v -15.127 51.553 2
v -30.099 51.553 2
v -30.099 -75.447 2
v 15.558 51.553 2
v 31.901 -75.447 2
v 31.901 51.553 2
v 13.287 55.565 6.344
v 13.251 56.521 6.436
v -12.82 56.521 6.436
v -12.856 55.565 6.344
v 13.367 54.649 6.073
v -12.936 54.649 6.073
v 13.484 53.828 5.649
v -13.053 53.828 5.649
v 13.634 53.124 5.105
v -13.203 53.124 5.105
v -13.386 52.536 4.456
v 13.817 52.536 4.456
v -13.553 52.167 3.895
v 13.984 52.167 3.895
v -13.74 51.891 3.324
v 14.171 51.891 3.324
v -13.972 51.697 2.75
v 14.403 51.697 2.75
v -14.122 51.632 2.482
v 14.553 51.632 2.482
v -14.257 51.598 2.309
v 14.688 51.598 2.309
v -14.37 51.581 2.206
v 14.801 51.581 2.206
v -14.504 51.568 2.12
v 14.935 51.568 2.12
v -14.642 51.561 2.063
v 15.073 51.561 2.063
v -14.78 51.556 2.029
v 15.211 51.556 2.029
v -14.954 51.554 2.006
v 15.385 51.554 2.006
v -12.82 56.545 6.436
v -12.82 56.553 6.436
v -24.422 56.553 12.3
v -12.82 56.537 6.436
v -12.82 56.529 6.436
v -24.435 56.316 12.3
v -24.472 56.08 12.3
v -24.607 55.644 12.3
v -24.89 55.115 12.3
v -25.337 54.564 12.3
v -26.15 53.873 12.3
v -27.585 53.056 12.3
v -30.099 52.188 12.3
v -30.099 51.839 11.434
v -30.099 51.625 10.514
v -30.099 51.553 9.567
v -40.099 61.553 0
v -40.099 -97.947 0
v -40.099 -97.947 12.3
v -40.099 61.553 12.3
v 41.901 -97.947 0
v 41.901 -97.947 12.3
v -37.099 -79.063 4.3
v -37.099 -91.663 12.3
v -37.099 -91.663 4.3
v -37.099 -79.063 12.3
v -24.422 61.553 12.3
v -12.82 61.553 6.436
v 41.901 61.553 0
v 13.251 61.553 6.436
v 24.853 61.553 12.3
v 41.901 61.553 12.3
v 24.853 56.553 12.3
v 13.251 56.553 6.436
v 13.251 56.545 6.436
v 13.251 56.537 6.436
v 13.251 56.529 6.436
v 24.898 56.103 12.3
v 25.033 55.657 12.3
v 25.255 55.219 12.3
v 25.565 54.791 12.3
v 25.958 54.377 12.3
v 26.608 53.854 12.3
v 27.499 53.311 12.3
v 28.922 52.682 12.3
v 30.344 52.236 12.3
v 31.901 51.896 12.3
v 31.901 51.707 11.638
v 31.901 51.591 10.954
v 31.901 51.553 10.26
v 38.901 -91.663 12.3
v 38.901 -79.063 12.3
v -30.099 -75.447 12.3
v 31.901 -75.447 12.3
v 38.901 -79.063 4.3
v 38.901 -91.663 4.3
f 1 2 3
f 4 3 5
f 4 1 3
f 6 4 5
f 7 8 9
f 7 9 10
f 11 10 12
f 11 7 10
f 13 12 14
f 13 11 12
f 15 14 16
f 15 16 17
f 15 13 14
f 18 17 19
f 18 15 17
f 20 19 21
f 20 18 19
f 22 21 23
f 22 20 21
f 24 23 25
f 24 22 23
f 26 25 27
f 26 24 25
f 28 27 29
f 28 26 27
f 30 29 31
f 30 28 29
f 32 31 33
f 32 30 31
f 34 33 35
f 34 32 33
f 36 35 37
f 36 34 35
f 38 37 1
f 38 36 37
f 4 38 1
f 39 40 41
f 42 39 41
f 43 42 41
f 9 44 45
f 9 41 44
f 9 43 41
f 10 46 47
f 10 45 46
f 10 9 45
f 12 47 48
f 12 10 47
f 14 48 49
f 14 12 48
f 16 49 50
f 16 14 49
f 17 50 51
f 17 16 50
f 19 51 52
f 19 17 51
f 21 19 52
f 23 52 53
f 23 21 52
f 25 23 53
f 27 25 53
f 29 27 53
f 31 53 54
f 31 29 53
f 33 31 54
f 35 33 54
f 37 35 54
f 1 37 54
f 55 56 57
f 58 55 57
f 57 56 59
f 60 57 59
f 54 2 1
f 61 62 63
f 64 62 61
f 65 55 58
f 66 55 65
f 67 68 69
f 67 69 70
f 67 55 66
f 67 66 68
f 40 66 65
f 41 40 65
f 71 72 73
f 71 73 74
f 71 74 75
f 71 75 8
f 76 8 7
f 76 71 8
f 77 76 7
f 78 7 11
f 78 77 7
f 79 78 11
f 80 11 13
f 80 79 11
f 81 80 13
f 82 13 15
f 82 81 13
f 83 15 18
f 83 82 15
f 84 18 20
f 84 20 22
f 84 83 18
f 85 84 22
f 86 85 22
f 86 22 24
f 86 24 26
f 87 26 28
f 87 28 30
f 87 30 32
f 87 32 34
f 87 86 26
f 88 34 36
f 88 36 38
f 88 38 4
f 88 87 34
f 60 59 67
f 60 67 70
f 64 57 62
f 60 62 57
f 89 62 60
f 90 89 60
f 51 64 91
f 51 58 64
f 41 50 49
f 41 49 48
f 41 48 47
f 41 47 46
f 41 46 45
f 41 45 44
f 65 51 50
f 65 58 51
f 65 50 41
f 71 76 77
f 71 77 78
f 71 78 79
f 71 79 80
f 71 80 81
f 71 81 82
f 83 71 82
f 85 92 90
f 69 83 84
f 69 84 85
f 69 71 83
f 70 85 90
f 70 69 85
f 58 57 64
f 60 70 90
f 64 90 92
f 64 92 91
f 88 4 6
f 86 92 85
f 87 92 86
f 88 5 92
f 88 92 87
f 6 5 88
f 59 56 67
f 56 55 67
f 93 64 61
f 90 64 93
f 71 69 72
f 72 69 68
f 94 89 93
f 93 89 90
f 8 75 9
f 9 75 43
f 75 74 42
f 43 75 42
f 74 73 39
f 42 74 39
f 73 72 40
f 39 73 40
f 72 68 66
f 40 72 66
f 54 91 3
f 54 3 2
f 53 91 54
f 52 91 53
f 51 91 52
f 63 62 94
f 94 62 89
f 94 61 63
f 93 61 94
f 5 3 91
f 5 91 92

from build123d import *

# Parameters (mm, degrees)
F0_W         = 82
F0_H         = 147
F0_W_2       = 62
F0_H_2       = 127
F1_DEPTH     = 12.3
F2_DEPTH     = 2
F4_DEPTH     = 12.5
F5_W         = 76
F5_H         = 12.6
F6_DEPTH     = 8
F7_DEPTH     = 25
F8_T4_DEPTH  = 38
F8_T10_DEPTH = 50.9116130734
F8_T16_DEPTH = 38
F8_T23_DEPTH = 38
F8_T28_DEPTH = 50.9116130734
F8_T35_DEPTH = 50.9116130734
F8_T39_DEPTH = 38


# Not quite as in the source:
# - a fillet or chamfer that OpenCascade refuses, or shapes differently, is made with other operations: its cross-section is extruded or revolved along the edge and cut away or added


with BuildPart() as f1:
    # F0 (on Top) → F1 (new body)
    with BuildSketch(Plane.XY):
        with Locations((0.9012136459, -11.9470648118)):
            Rectangle(F0_W, F0_H)
        with Locations((0.9012136459, -11.9470648118)):
            Rectangle(F0_W_2, F0_H_2, mode=Mode.SUBTRACT)
    extrude(amount=F1_DEPTH)

    # F0 (on Top) → F2 (join)
    with BuildSketch(Plane.XY):
        with Locations((0.9012136459, -11.9470648118)):
            Rectangle(F0_W_2, F0_H_2)
    extrude(amount=F2_DEPTH)

    # F4 (add): a face of the model
    f4_faces = [f1.faces().sort_by_distance(p)[0] for p in [
        (0.9012136459, -85.4470648118, 6.15),
    ]]
    extrude(f4_faces, amount=F4_DEPTH)

    # F5 (on face) → F6 (cut)
    with BuildSketch(Plane.XY.offset(12.3)):
        with Locations((0.9012136459, -85.3629247222)):
            Rectangle(F5_W, F5_H)
    extrude(amount=-F6_DEPTH, mode=Mode.SUBTRACT)

    # F3 (on face) → F7 (cut)
    with BuildSketch(Plane(origin=(0, 61.5529351882, 0), x_dir=(-1, 0, 0), z_dir=(0, 1, 0))):
        Polygon((24.4224453152, 12.3), (-24.8533971608, 12.3), (-13.251022455, 6.4361359849), (12.8200706095, 6.4361359849), align=None)
    extrude(amount=-F7_DEPTH, mode=Mode.SUBTRACT)

    # F8: fillet of radius 5 on 3 edges, made by hand


with BuildPart() as f8_tool2:
    # F8_s3 → F8_t4 (new body)
    with BuildSketch(Plane(origin=(-1.6465684555, 0, 0.8321790805), x_dir=(0, 1, 0), z_dir=(-0.892490362, 0, 0.4510664627))):
        with BuildLine():
            ThreePointArc((56.5529351882, 0.0385145664), (53.0174012823, 1.5029806605), (51.5529351882, 5.0385145664))
            Line((51.5529351882, 5.0385145664), (51.5529351882, 0.0385145664))
            Line((51.5529351882, 0.0385145664), (56.5529351882, 0.0385145664))
        make_face()
    extrude(amount=F8_T4_DEPTH)

    split(bisect_by=Plane.XY.offset(6.4361359849), keep=Keep.TOP)

    split(bisect_by=Plane.YZ.offset(-30.0987863541), keep=Keep.TOP)


with BuildPart() as f1_1:
    add(f1.part)

    # F8_t1: cut F8_tool2
    add(f8_tool2.part, mode=Mode.SUBTRACT)


with BuildPart() as f8_tool8:
    # F8_s9 → F8_t10 (new body)
    with BuildSketch(Plane.YZ.offset(25.6712824595)):
        with BuildLine():
            ThreePointArc((56.52103919, 6.4361359849), (53.1908229865, 5.1657016483), (51.5529351882, 2))
            Line((51.5529351882, 2), (51.5529351882, 6.4361359849))
            Line((51.5529351882, 6.4361359849), (56.52103919, 6.4361359849))
        make_face()
    extrude(amount=-F8_T10_DEPTH)

    split(bisect_by=Plane(origin=(-0.0173726292, 0, -0.0343738793), x_dir=(0, 1, 0), z_dir=(0.4510664627, 0, 0.892490362)), keep=Keep.TOP)

    split(bisect_by=Plane(origin=(0.1050545028, 0, -0.2078632285), x_dir=(0, 1, 0), z_dir=(-0.4510664627, 0, 0.892490362)), keep=Keep.TOP)


with BuildPart() as f1_2:
    add(f1_1.part)

    # F8_t7: cut F8_tool8
    add(f8_tool8.part, mode=Mode.SUBTRACT)


with BuildPart() as f8_tool14:
    # F8_s15 → F8_t16 (new body)
    with BuildSketch(Plane(origin=(35.9044721827, 0, 18.1461940123), x_dir=(0, 1, 0), z_dir=(-0.892490362, 0, -0.4510664627))):
        with BuildLine():
            ThreePointArc((56.5529351882, 0.232902491), (53.0174012823, 1.6973685851), (51.5529351882, 5.232902491))
            Line((51.5529351882, 5.232902491), (51.5529351882, 0.232902491))
            Line((51.5529351882, 0.232902491), (56.5529351882, 0.232902491))
        make_face()
    extrude(amount=F8_T16_DEPTH)

    split(bisect_by=Plane.XY.offset(6.4361359849), keep=Keep.TOP)

    split(bisect_by=Plane.YZ.offset(31.9012136459), keep=Keep.BOTTOM)


with BuildPart() as f1_3:
    add(f1_2.part)

    # F8_t13: cut F8_tool14
    add(f8_tool14.part, mode=Mode.SUBTRACT)


with BuildPart() as f8_tool21:
    # F8_s22 → F8_t23 (new body)
    with BuildSketch(Plane(origin=(-1.6465684555, 0, 0.8321790805), x_dir=(0, 1, 0), z_dir=(-0.892490362, 0, 0.4510664627))):
        with BuildLine():
            ThreePointArc((56.5529351882, 0.0385145664), (53.0174012823, 1.5029806605), (51.5529351882, 5.0385145664))
            Line((51.5529351882, 5.0385145664), (51.5529351882, 0.0385145664))
            Line((51.5529351882, 0.0385145664), (56.5529351882, 0.0385145664))
        make_face()
    extrude(amount=F8_T23_DEPTH)

    split(bisect_by=Plane.XY.offset(6.4361359849), keep=Keep.BOTTOM)

    split(bisect_by=Plane.XY.offset(2), keep=Keep.TOP)


with BuildPart() as f8_tool26:
    # F8_s27 → F8_t28 (new body)
    with BuildSketch(Plane.YZ.offset(25.6712824595)):
        with BuildLine():
            ThreePointArc((56.52103919, 6.4361359849), (53.1908229865, 5.1657016483), (51.5529351882, 2))
            Line((51.5529351882, 2), (51.5529351882, 6.4361359849))
            Line((51.5529351882, 6.4361359849), (56.52103919, 6.4361359849))
        make_face()
    extrude(amount=-F8_T28_DEPTH)

    split(bisect_by=Plane(origin=(-0.0173726292, 0, -0.0343738793), x_dir=(0, 1, 0), z_dir=(-0.4510664627, 0, -0.892490362)), keep=Keep.TOP)


with BuildPart() as f8_tool21_1:
    add(f8_tool21.part)

    # F8_t30: intersect F8_tool26
    add(f8_tool26.part, mode=Mode.INTERSECT)


with BuildPart() as f1_4:
    add(f1_3.part)

    # F8_t19: cut F8_tool21
    add(f8_tool21_1.part, mode=Mode.SUBTRACT)


with BuildPart() as f8_tool33:
    # F8_s34 → F8_t35 (new body)
    with BuildSketch(Plane.YZ.offset(25.6712824595)):
        with BuildLine():
            ThreePointArc((56.52103919, 6.4361359849), (53.1908229865, 5.1657016483), (51.5529351882, 2))
            Line((51.5529351882, 2), (51.5529351882, 6.4361359849))
            Line((51.5529351882, 6.4361359849), (56.52103919, 6.4361359849))
        make_face()
    extrude(amount=-F8_T35_DEPTH)

    split(bisect_by=Plane(origin=(0.1050545028, 0, -0.2078632285), x_dir=(0, 1, 0), z_dir=(0.4510664627, 0, -0.892490362)), keep=Keep.TOP)


with BuildPart() as f8_tool37:
    # F8_s38 → F8_t39 (new body)
    with BuildSketch(Plane(origin=(35.9044721827, 0, 18.1461940123), x_dir=(0, 1, 0), z_dir=(-0.892490362, 0, -0.4510664627))):
        with BuildLine():
            ThreePointArc((56.5529351882, 0.232902491), (53.0174012823, 1.6973685851), (51.5529351882, 5.232902491))
            Line((51.5529351882, 5.232902491), (51.5529351882, 0.232902491))
            Line((51.5529351882, 0.232902491), (56.5529351882, 0.232902491))
        make_face()
    extrude(amount=F8_T39_DEPTH)

    split(bisect_by=Plane.XY.offset(6.4361359849), keep=Keep.BOTTOM)

    split(bisect_by=Plane.XY.offset(2), keep=Keep.TOP)


with BuildPart() as f8_tool33_1:
    add(f8_tool33.part)

    # F8_t42: intersect F8_tool37
    add(f8_tool37.part, mode=Mode.INTERSECT)


with BuildPart() as f1_5:
    add(f1_4.part)

    # F8_t31: cut F8_tool33
    add(f8_tool33_1.part, mode=Mode.SUBTRACT)


solid = f1_5.part
